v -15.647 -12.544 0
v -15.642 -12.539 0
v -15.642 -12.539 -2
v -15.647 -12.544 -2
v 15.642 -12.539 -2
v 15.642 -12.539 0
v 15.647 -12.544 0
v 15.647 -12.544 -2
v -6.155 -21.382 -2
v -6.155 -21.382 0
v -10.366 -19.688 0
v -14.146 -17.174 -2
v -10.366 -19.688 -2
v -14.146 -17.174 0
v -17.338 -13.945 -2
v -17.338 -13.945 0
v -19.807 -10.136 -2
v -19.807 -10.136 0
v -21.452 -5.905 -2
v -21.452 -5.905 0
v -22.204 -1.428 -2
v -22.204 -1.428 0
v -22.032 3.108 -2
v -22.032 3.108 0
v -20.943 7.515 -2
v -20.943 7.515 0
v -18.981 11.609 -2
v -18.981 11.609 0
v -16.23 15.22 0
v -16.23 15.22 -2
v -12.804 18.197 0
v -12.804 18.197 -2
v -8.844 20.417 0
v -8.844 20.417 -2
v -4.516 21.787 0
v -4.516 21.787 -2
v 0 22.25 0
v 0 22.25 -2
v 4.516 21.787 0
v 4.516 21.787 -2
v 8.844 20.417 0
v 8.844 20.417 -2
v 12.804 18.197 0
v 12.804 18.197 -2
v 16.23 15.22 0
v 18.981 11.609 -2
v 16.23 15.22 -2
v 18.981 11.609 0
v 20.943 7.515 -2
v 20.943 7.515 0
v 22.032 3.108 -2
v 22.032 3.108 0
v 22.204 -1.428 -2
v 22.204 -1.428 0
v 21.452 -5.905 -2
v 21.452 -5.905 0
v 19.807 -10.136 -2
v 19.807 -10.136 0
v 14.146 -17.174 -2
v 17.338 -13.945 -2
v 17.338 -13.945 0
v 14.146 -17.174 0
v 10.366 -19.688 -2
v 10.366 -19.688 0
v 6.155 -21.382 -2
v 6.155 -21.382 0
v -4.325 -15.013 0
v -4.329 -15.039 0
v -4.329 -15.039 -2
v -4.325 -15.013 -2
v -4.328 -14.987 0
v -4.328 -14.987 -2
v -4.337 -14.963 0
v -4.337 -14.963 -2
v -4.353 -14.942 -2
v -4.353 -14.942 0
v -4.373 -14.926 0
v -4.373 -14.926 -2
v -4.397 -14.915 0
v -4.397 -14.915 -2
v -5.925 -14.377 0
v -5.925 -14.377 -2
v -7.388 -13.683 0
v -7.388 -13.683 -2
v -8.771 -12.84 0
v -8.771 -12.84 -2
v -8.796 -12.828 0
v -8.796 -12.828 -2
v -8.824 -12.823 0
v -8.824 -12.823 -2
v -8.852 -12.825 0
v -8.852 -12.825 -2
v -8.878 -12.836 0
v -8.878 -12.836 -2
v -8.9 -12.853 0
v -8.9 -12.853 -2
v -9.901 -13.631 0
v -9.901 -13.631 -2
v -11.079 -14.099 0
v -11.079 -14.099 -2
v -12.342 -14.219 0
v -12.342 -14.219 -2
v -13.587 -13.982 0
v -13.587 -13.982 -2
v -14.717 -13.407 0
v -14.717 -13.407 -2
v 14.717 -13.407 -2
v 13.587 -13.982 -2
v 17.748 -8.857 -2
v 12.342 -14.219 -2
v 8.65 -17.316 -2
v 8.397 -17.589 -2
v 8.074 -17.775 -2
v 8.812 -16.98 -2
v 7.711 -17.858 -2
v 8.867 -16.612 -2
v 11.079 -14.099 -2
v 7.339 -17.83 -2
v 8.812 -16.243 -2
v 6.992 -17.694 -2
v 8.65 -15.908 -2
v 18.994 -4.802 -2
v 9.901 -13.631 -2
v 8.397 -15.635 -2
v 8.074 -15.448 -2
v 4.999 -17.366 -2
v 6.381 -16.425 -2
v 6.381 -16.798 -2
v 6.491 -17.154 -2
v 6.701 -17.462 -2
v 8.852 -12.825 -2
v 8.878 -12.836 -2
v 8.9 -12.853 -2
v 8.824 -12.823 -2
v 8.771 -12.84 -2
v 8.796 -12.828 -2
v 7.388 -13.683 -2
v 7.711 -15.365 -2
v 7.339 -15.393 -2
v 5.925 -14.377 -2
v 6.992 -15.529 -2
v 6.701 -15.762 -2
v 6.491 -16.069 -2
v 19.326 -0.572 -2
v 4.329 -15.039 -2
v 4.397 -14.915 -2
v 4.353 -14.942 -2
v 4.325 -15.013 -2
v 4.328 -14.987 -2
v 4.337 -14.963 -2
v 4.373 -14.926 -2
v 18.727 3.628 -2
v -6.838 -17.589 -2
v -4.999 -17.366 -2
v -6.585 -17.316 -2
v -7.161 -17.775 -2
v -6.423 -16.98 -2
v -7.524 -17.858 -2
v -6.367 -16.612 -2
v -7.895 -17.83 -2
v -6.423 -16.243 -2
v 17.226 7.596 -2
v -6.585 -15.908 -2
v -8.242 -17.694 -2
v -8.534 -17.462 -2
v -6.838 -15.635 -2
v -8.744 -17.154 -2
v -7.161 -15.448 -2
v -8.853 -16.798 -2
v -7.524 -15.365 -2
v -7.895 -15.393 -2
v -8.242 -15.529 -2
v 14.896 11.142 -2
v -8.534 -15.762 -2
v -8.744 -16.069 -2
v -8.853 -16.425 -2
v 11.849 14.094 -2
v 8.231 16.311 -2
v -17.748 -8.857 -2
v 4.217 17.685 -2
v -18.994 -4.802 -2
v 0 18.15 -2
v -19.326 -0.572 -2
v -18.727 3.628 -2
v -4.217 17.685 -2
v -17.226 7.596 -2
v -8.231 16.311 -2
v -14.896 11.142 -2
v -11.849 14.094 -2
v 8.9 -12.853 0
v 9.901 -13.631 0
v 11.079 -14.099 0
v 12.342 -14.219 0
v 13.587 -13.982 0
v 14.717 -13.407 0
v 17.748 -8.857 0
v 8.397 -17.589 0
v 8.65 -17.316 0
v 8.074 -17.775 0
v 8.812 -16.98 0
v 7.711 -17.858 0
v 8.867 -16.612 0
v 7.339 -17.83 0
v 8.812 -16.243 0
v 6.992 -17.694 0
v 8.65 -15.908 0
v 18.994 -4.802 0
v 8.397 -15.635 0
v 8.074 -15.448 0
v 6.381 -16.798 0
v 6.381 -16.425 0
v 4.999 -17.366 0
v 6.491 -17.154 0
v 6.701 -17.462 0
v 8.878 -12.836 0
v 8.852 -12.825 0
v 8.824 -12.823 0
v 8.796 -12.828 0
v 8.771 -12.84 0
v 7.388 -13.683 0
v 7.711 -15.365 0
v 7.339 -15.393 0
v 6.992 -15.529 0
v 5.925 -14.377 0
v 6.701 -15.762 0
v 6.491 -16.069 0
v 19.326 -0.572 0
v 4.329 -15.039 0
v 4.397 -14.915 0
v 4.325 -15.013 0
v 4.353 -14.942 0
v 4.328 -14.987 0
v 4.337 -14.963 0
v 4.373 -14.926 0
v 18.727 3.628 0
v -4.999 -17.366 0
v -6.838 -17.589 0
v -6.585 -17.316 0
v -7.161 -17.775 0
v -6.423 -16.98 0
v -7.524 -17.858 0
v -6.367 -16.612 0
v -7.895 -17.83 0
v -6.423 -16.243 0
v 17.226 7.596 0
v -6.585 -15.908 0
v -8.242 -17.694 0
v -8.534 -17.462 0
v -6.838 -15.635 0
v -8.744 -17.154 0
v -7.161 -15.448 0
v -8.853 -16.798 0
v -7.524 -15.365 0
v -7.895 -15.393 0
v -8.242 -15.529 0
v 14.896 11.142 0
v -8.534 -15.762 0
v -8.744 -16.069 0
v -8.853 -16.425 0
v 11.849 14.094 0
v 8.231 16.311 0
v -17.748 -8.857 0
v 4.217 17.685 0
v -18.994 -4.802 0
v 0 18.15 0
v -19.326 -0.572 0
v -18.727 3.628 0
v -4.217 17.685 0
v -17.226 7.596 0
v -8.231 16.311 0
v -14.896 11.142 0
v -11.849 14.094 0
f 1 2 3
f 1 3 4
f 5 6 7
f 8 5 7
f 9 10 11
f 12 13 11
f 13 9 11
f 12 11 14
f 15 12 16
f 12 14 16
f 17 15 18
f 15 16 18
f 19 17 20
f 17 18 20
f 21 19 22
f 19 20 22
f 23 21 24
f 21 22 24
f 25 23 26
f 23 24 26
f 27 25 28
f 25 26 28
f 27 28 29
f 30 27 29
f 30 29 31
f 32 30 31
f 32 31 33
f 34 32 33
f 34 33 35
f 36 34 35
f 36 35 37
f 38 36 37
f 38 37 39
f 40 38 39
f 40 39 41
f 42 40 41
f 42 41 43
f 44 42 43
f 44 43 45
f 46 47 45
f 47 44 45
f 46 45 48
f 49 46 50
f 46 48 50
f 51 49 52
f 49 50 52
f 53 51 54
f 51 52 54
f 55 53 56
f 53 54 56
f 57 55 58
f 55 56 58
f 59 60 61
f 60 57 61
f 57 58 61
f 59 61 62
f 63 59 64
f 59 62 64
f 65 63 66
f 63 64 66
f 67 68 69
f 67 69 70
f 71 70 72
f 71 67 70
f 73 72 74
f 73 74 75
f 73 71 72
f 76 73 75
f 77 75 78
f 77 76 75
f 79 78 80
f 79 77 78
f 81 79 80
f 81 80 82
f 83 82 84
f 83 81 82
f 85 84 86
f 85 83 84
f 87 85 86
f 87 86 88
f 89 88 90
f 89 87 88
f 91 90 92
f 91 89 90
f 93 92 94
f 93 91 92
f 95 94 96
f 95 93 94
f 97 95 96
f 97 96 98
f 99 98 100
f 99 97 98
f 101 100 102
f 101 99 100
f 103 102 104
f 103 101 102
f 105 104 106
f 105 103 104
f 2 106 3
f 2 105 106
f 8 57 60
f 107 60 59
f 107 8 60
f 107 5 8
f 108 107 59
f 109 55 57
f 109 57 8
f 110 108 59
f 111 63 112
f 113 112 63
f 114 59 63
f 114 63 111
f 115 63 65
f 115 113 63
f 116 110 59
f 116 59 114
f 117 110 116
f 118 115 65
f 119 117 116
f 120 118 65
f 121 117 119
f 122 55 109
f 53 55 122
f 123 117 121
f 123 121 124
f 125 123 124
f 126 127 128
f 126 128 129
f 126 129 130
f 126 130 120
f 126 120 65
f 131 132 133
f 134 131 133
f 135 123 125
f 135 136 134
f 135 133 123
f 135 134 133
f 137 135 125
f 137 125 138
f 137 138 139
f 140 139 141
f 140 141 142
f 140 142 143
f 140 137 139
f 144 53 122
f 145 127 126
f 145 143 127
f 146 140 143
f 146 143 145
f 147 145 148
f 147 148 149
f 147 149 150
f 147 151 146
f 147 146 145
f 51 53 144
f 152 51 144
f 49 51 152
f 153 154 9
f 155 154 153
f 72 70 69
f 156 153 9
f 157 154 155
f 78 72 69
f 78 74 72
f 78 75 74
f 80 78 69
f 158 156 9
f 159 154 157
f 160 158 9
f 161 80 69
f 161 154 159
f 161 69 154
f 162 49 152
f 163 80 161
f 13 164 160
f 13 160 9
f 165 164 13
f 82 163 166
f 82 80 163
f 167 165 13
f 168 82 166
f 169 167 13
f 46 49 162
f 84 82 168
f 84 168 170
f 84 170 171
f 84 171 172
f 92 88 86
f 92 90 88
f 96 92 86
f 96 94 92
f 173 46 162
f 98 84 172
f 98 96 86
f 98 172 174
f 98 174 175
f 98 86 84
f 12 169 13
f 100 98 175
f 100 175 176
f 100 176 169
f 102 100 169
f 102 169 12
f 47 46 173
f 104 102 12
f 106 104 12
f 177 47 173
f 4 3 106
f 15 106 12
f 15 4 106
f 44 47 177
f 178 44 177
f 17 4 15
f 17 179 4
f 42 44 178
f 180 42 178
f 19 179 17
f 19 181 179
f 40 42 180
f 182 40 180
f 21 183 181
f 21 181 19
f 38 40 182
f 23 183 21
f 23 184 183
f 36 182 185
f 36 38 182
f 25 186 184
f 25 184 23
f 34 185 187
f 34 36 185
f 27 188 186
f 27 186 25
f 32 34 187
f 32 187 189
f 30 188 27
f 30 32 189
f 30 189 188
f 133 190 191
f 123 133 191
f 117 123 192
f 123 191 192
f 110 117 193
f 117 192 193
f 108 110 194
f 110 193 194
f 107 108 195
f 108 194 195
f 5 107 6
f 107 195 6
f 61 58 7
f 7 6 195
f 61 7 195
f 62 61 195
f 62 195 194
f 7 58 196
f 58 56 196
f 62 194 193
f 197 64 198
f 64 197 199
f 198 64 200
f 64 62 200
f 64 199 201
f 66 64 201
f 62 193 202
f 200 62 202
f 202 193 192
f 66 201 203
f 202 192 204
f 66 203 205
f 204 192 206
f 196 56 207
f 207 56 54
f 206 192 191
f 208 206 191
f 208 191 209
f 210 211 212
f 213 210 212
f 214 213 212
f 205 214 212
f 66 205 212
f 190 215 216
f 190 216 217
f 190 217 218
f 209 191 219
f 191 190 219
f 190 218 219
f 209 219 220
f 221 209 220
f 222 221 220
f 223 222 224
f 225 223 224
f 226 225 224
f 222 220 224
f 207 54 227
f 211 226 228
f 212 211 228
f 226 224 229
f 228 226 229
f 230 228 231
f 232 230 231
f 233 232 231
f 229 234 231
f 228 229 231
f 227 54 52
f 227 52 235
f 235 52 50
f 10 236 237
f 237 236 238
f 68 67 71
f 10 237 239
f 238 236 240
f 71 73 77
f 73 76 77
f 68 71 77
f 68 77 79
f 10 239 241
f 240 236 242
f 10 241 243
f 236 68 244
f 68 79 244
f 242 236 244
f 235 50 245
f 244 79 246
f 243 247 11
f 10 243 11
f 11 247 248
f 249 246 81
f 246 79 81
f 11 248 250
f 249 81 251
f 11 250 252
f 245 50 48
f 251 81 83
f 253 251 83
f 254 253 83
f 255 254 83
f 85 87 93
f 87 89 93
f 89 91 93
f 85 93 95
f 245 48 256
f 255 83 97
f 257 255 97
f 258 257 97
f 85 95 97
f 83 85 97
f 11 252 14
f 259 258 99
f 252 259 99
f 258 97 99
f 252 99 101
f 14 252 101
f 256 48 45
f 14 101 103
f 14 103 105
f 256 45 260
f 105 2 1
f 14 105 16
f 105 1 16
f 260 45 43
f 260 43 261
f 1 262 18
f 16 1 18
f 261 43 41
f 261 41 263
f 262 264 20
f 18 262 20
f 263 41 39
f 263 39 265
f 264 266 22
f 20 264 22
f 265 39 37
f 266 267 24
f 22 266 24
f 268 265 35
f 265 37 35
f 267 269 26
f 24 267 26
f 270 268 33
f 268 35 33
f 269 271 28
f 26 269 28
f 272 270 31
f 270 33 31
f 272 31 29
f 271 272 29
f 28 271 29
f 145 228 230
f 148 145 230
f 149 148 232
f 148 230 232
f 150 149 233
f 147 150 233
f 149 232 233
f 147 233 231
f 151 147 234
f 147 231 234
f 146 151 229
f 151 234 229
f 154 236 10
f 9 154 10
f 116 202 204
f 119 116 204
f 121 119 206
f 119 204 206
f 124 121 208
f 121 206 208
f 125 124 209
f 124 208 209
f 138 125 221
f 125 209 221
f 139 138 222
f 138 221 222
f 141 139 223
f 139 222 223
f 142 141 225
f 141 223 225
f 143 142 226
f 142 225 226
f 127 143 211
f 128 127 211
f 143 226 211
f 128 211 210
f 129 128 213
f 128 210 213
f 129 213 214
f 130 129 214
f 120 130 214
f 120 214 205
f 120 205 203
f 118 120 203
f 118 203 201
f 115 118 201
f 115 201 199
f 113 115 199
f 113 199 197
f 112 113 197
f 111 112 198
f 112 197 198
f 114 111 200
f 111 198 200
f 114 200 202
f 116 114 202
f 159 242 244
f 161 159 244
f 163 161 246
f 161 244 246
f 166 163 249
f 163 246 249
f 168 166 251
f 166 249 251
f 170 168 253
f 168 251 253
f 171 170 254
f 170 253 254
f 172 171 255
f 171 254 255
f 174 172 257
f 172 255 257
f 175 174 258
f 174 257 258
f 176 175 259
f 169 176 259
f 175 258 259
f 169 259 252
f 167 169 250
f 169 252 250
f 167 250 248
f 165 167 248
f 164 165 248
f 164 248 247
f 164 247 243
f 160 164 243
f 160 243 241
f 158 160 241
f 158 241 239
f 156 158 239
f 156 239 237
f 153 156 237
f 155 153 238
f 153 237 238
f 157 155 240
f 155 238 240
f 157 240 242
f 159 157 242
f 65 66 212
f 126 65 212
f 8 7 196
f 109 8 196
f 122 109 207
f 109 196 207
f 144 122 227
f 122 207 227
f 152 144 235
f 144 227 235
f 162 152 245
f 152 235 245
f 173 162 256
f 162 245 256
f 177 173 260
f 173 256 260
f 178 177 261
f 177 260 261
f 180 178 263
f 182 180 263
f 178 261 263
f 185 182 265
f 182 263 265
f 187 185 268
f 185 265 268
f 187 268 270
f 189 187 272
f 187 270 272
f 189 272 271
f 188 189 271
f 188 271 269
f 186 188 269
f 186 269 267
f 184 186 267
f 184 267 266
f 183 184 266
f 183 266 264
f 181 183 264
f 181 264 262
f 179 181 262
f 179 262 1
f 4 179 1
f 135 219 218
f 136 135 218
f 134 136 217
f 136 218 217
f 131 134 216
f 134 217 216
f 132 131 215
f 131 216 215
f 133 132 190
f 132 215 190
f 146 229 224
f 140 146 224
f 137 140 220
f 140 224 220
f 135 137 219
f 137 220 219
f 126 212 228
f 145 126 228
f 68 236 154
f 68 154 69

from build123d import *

# Parameters (mm, degrees)
BODYSKE_R    = 1.25
BODY_DEPTH   = 2
MODLUGSKE_R  = 1.25
MODLUG_DEPTH = 2


with BuildPart() as part:
    # BodySke → Body (new body)
    with BuildSketch(Plane.XY):
        with BuildLine():
            Line((6.15473831, -21.381807602), (4.998669473, -17.365578122))
            ThreePointArc((4.998669473, -17.365578122), (6.301661395, -14.225456519), (9.652536987, -14.799725088))
            ThreePointArc((9.652536987, -14.799725088), (11.602164826, -15.711310789), (13.605169738, -14.923904589))
            ThreePointArc((13.605169738, -14.923904589), (0, 18.15), (-13.605169738, -14.923904589))
            ThreePointArc((-13.605169738, -14.923904589), (-11.602164826, -15.711310789), (-9.652536987, -14.799725088))
            ThreePointArc((-9.652536987, -14.799725088), (-6.301661395, -14.225456519), (-4.998669473, -17.365578122))
            Line((-4.998669473, -17.365578122), (-6.15473831, -21.381807602))
            ThreePointArc((-6.15473831, -21.381807602), (0, 22.25), (6.15473831, -21.381807602))
        make_face()
        with Locations((7.617340292, -16.611795564)):
            Circle(BODYSKE_R, mode=Mode.SUBTRACT)
        with Locations((-7.617340292, -16.611795564)):
            Circle(BODYSKE_R, mode=Mode.SUBTRACT)
    extrude(amount=-BODY_DEPTH)

    # ModLugSke → ModLug (add, through all)
    with BuildSketch(Plane.XY):
        with BuildLine():
            Line((6.15473831, -21.381807602), (4.328974749, -15.039031805))
            ThreePointArc((4.328974749, -15.039031805), (4.337407237, -14.963258149), (4.396797536, -14.915450762))
            ThreePointArc((4.396797536, -14.915450762), (6.665405802, -14.049016531), (8.771452297, -12.839942547))
            ThreePointArc((8.771452297, -12.839942547), (8.837981797, -12.823028062), (8.899741793, -12.852994325))
            ThreePointArc((8.899741793, -12.852994325), (12.341754083, -14.219037165), (15.642102603, -12.539388009))
            Line((15.642102603, -12.539388009), (17.360405349, -13.916854031))
            ThreePointArc((17.360405349, -13.916854031), (12.335796621, -18.517306006), (6.15473831, -21.381807602))
        make_face()
        with Locations((7.617340292, -16.611795564)):
            Circle(MODLUGSKE_R, mode=Mode.SUBTRACT)
        with BuildLine():
            Line((-6.15473831, -21.381807602), (-4.328974749, -15.039031805))
            ThreePointArc((-4.328974749, -15.039031805), (-4.337407237, -14.963258149), (-4.396797536, -14.915450762))
            ThreePointArc((-4.396797536, -14.915450762), (-6.665405802, -14.049016531), (-8.771452297, -12.839942547))
            ThreePointArc((-8.771452297, -12.839942547), (-8.837981797, -12.823028062), (-8.899741793, -12.852994325))
            ThreePointArc((-8.899741793, -12.852994325), (-12.341754083, -14.219037165), (-15.642102603, -12.539388009))
            Line((-15.642102603, -12.539388009), (-17.360405349, -13.916854031))
            ThreePointArc((-17.360405349, -13.916854031), (-12.335796621, -18.517306006), (-6.15473831, -21.381807602))
        make_face()
        with Locations((-7.617340292, -16.611795564)):
            Circle(MODLUGSKE_R, mode=Mode.SUBTRACT)
    extrude(amount=-MODLUG_DEPTH)


solid = part.part
